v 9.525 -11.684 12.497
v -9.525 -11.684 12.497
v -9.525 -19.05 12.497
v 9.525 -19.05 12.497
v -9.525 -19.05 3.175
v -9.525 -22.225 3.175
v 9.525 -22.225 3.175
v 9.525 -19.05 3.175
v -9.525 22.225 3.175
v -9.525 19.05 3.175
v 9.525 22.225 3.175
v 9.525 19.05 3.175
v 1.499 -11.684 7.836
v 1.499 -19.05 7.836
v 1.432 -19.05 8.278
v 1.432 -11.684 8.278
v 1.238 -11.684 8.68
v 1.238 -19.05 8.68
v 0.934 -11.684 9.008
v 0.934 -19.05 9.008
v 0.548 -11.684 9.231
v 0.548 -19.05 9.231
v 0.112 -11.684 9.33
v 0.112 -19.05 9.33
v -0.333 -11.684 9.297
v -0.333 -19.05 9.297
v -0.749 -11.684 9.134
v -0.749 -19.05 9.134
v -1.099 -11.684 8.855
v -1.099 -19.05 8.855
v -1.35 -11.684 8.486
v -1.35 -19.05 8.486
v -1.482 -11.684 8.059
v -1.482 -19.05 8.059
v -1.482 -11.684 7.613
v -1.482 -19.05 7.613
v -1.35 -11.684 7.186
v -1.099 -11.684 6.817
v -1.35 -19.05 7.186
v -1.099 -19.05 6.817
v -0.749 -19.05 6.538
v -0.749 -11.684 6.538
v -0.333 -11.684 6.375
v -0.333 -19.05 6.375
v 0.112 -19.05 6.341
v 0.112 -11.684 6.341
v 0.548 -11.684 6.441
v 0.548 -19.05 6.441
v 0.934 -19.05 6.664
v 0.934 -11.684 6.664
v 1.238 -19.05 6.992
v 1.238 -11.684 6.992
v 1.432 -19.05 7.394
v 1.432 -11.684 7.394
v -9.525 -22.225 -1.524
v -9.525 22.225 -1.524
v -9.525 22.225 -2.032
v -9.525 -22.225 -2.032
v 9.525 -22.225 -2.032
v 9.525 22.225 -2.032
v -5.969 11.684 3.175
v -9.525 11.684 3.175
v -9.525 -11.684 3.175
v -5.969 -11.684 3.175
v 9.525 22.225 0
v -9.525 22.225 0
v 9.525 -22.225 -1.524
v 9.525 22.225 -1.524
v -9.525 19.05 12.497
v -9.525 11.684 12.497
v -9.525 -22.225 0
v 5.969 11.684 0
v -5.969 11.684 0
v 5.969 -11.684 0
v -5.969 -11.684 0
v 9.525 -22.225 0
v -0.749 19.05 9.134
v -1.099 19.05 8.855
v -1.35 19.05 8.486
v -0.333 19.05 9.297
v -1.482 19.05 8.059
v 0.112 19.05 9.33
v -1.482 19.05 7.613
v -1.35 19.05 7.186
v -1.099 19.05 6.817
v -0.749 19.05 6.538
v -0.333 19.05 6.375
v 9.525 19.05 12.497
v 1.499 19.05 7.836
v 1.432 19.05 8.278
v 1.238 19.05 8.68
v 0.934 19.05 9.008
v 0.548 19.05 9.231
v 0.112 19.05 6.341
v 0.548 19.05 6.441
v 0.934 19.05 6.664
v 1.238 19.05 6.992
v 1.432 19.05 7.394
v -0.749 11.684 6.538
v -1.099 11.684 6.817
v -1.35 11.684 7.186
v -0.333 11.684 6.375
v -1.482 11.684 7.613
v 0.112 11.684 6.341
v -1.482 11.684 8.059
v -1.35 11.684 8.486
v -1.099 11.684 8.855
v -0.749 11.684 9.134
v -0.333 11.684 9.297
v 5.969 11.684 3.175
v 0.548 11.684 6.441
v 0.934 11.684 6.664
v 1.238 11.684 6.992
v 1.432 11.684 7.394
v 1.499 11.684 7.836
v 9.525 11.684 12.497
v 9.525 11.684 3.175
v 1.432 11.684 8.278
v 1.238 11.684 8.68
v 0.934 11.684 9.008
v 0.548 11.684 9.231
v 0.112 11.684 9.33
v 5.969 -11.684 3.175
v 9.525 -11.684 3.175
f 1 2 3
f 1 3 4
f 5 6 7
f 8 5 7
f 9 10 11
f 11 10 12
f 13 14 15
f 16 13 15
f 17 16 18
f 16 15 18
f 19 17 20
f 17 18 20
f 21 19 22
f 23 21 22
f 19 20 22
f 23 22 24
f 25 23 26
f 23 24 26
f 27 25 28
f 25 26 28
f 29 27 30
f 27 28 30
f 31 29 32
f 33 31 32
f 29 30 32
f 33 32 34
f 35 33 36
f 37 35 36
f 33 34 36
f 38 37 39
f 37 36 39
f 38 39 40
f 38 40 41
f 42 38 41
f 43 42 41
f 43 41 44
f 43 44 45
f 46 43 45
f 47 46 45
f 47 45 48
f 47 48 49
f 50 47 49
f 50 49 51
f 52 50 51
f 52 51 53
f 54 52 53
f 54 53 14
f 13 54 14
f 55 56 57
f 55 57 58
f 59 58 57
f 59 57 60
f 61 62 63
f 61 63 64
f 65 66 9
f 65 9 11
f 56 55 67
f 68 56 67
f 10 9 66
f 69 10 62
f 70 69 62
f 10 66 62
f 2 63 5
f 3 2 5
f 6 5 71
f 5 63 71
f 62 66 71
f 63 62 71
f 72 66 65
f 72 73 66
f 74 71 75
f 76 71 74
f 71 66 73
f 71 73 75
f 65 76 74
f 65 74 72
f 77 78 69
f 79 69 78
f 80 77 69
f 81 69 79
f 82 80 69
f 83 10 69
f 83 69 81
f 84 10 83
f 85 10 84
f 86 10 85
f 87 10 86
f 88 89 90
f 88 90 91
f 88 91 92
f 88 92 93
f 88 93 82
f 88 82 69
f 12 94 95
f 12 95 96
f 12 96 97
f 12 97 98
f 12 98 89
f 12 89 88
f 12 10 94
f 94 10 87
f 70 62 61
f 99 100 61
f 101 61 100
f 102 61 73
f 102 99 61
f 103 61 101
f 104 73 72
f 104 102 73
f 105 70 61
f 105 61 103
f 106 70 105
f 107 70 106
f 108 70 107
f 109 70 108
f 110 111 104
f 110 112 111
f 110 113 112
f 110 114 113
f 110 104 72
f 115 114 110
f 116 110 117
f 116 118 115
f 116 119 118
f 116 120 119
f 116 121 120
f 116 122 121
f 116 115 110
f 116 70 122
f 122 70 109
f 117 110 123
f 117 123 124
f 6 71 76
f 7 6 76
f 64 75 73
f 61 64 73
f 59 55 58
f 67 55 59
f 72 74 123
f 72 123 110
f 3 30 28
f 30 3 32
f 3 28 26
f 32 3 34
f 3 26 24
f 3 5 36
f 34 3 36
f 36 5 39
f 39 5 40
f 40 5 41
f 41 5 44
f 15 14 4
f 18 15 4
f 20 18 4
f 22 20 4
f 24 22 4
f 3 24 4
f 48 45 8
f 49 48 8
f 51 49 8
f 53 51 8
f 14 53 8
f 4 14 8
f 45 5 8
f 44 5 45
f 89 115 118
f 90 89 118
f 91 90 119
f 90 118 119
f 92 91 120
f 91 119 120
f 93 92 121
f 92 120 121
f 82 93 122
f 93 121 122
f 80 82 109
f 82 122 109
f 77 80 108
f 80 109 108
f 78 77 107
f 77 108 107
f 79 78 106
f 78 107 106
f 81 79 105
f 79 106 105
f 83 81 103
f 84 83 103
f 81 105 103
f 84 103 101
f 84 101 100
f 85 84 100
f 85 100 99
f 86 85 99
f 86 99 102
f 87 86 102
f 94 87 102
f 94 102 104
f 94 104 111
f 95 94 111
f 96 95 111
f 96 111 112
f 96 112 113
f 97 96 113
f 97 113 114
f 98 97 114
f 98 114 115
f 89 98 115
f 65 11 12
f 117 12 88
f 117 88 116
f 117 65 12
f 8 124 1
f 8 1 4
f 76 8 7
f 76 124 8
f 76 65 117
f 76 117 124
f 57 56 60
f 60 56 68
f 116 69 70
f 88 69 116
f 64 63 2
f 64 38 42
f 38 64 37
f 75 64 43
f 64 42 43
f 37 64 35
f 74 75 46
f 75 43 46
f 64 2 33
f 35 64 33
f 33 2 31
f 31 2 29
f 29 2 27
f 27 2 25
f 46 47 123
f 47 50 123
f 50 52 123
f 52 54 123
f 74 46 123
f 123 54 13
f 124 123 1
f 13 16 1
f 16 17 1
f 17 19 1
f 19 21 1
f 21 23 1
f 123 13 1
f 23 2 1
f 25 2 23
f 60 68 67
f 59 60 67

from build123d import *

# Parameters (mm, degrees)
F0_W      = 19.05
F0_H      = 38.1
F0_W_2    = 11.938
F0_H_2    = 23.368
F1_DEPTH  = 12.4968
F2_W      = 19.05
F2_H      = 44.45
F2_W_2    = 11.938
F2_H_2    = 23.368
F3_DEPTH  = 3.175
F4_W      = 3.556
F4_H      = 23.368
F5_DEPTH  = 9.3218
F6_R      = 1.4986
F7_DEPTH  = 41.276
F9_W      = 19.05
F9_H      = 44.45
F10_DEPTH = 0.508


with BuildPart() as f1:
    # F0 (on Top) → F1 (new body)
    with BuildSketch(Plane.XY):
        Rectangle(F0_W, F0_H)
        Rectangle(F0_W_2, F0_H_2, mode=Mode.SUBTRACT)
    extrude(amount=F1_DEPTH)

    # F2 (on face) → F3 (join)
    with BuildSketch(Plane(origin=(0, 0, 0), x_dir=(1, 0, 0), z_dir=(0, 0, -1))):
        Rectangle(F2_W, F2_H)
        Rectangle(F2_W_2, F2_H_2, mode=Mode.SUBTRACT)
    extrude(amount=-F3_DEPTH)

    # F4 (on face) → F5 (cut, through all)
    with BuildSketch(Plane.XY.offset(12.4968)):
        with Locations((-7.747, 0)):
            Rectangle(F4_W, F4_H)
        with Locations((7.747, 0)):
            Rectangle(F4_W, F4_H)
    extrude(amount=-F5_DEPTH, mode=Mode.SUBTRACT)

    # F6 (on face) → F7 (cut, through all)
    with BuildSketch(Plane.XZ.offset(19.05)):
        with Locations((0, 7.8359)):
            Circle(F6_R)
    extrude(amount=-F7_DEPTH, mode=Mode.SUBTRACT)


with BuildPart() as f10:
    # F9 (on offset) → F10 (new body)
    with BuildSketch(Plane(origin=(0, 0, -1.524), x_dir=(1, 0, 0), z_dir=(0, 0, -1))):
        Rectangle(F9_W, F9_H)
    extrude(amount=F10_DEPTH)


solid = Compound([f1.part, f10.part])
